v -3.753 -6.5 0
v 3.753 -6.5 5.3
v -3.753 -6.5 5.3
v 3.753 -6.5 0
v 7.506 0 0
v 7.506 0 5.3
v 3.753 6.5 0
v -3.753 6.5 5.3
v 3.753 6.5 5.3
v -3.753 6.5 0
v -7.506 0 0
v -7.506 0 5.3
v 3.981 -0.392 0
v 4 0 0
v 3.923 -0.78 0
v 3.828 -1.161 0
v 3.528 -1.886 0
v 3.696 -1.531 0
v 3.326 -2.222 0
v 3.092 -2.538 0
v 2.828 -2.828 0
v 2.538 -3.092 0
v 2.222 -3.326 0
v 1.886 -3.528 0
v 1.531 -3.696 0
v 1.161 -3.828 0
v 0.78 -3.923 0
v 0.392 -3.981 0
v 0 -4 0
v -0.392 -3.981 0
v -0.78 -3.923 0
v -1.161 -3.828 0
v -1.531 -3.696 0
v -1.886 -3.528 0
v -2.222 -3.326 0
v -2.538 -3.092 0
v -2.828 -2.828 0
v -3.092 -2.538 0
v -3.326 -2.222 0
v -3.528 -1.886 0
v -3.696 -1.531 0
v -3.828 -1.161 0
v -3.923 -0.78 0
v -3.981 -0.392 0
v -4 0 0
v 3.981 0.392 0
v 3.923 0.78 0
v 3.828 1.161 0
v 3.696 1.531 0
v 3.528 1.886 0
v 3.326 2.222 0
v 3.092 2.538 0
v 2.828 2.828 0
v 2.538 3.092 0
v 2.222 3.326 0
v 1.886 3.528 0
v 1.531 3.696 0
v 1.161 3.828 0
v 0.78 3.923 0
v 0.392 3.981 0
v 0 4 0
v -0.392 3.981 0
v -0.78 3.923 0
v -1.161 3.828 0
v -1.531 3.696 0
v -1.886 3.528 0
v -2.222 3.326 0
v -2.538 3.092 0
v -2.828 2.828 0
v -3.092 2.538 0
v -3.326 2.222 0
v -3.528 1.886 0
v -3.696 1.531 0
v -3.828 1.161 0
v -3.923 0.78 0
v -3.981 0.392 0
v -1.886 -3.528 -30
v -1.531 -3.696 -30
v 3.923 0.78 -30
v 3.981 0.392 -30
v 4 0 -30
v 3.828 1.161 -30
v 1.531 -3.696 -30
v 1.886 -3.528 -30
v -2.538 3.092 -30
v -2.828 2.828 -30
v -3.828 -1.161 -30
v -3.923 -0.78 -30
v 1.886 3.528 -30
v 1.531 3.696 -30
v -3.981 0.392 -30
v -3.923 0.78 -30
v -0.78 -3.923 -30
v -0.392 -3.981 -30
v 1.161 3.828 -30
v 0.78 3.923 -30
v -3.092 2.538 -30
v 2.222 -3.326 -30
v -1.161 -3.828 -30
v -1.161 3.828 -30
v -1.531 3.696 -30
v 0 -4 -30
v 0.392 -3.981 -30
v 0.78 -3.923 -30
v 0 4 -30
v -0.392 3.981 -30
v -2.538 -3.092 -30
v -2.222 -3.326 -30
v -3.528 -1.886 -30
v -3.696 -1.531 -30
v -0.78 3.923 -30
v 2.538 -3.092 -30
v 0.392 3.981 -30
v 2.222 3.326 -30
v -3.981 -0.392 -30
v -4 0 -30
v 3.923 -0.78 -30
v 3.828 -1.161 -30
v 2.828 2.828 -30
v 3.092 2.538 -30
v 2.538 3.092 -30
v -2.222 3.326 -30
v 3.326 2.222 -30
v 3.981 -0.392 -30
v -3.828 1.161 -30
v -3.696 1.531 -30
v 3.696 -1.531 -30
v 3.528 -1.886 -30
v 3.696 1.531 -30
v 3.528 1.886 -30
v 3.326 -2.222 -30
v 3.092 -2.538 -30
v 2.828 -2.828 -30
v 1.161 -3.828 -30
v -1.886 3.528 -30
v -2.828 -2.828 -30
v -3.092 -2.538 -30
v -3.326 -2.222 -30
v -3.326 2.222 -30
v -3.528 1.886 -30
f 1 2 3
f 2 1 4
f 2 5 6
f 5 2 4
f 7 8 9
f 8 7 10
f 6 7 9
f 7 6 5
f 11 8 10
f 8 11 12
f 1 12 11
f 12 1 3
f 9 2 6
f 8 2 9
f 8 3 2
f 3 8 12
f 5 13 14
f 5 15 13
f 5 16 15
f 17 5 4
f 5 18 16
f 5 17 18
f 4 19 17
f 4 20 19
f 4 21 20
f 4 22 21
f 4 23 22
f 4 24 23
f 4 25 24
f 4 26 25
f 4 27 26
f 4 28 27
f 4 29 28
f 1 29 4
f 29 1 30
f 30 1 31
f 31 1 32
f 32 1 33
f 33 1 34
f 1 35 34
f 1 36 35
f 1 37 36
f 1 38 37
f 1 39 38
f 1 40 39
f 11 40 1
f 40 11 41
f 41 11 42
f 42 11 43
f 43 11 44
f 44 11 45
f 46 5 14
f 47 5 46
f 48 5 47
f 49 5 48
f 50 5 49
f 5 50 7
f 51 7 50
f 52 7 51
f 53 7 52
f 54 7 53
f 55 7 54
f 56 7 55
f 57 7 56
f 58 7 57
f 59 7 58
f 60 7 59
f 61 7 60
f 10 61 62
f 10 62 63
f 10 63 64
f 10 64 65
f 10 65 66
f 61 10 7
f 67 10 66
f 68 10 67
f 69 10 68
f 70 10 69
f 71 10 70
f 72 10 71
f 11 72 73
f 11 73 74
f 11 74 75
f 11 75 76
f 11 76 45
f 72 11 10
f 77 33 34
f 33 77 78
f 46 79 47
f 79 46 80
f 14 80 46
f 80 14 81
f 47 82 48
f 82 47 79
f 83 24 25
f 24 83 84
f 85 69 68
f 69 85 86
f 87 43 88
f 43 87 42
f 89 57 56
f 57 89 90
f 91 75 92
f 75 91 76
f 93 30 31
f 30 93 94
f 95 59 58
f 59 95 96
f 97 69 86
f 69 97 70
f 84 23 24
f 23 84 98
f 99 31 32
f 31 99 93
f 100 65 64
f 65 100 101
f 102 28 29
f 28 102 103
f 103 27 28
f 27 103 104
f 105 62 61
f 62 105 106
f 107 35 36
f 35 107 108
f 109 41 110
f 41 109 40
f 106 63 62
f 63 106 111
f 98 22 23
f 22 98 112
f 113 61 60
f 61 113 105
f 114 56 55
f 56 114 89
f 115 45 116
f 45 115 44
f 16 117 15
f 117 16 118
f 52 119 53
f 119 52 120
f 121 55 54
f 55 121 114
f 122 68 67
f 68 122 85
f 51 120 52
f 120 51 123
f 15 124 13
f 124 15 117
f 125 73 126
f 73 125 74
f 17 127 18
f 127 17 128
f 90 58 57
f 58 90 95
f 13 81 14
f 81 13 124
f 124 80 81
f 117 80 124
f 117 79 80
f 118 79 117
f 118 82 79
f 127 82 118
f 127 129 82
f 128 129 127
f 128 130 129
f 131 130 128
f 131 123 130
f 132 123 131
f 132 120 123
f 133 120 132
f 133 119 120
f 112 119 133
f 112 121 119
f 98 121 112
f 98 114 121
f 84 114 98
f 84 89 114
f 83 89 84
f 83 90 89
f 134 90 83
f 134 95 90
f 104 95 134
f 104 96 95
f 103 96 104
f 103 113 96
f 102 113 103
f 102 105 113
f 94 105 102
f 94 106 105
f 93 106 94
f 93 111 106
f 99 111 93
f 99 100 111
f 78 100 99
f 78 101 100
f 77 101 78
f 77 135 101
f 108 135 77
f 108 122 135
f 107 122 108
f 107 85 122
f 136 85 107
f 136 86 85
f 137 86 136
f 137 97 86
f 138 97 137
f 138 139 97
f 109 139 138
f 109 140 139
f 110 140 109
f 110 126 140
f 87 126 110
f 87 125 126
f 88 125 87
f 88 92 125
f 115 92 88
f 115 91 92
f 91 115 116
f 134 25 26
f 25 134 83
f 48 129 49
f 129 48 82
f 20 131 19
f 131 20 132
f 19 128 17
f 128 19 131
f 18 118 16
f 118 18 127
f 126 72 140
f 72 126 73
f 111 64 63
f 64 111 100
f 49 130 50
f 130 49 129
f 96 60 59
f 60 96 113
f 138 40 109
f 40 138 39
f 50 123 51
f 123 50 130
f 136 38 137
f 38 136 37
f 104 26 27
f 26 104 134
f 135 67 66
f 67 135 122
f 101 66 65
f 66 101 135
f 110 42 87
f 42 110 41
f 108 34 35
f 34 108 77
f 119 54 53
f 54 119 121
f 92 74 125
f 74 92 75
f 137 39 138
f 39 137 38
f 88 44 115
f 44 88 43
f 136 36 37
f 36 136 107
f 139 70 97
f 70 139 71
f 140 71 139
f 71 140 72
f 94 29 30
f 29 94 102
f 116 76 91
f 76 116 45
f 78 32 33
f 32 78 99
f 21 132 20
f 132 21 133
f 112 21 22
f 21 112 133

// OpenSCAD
// M8 Hex Bolt (Simplified model)
$fn = 64;

// 頭部: 六角柱 (Across-flats 13mm, Height 5.3mm)
// OpenSCADのcylinder($fn=6)において d は外接円の直径（対角距離）となるため、
// 対辺距離(S)を13mmにするための直径(D)は D = S / cos(30) で計算します。
cylinder(h = 5.3, d = 13 / cos(30), $fn = 6);

// シャンク: 円柱 (Diameter 8mm, Length 30mm)
// 頭部の底面(z=0)から負の方向へ30mm伸ばします。
translate([0, 0, -30])
    cylinder(h = 30, d = 8);
